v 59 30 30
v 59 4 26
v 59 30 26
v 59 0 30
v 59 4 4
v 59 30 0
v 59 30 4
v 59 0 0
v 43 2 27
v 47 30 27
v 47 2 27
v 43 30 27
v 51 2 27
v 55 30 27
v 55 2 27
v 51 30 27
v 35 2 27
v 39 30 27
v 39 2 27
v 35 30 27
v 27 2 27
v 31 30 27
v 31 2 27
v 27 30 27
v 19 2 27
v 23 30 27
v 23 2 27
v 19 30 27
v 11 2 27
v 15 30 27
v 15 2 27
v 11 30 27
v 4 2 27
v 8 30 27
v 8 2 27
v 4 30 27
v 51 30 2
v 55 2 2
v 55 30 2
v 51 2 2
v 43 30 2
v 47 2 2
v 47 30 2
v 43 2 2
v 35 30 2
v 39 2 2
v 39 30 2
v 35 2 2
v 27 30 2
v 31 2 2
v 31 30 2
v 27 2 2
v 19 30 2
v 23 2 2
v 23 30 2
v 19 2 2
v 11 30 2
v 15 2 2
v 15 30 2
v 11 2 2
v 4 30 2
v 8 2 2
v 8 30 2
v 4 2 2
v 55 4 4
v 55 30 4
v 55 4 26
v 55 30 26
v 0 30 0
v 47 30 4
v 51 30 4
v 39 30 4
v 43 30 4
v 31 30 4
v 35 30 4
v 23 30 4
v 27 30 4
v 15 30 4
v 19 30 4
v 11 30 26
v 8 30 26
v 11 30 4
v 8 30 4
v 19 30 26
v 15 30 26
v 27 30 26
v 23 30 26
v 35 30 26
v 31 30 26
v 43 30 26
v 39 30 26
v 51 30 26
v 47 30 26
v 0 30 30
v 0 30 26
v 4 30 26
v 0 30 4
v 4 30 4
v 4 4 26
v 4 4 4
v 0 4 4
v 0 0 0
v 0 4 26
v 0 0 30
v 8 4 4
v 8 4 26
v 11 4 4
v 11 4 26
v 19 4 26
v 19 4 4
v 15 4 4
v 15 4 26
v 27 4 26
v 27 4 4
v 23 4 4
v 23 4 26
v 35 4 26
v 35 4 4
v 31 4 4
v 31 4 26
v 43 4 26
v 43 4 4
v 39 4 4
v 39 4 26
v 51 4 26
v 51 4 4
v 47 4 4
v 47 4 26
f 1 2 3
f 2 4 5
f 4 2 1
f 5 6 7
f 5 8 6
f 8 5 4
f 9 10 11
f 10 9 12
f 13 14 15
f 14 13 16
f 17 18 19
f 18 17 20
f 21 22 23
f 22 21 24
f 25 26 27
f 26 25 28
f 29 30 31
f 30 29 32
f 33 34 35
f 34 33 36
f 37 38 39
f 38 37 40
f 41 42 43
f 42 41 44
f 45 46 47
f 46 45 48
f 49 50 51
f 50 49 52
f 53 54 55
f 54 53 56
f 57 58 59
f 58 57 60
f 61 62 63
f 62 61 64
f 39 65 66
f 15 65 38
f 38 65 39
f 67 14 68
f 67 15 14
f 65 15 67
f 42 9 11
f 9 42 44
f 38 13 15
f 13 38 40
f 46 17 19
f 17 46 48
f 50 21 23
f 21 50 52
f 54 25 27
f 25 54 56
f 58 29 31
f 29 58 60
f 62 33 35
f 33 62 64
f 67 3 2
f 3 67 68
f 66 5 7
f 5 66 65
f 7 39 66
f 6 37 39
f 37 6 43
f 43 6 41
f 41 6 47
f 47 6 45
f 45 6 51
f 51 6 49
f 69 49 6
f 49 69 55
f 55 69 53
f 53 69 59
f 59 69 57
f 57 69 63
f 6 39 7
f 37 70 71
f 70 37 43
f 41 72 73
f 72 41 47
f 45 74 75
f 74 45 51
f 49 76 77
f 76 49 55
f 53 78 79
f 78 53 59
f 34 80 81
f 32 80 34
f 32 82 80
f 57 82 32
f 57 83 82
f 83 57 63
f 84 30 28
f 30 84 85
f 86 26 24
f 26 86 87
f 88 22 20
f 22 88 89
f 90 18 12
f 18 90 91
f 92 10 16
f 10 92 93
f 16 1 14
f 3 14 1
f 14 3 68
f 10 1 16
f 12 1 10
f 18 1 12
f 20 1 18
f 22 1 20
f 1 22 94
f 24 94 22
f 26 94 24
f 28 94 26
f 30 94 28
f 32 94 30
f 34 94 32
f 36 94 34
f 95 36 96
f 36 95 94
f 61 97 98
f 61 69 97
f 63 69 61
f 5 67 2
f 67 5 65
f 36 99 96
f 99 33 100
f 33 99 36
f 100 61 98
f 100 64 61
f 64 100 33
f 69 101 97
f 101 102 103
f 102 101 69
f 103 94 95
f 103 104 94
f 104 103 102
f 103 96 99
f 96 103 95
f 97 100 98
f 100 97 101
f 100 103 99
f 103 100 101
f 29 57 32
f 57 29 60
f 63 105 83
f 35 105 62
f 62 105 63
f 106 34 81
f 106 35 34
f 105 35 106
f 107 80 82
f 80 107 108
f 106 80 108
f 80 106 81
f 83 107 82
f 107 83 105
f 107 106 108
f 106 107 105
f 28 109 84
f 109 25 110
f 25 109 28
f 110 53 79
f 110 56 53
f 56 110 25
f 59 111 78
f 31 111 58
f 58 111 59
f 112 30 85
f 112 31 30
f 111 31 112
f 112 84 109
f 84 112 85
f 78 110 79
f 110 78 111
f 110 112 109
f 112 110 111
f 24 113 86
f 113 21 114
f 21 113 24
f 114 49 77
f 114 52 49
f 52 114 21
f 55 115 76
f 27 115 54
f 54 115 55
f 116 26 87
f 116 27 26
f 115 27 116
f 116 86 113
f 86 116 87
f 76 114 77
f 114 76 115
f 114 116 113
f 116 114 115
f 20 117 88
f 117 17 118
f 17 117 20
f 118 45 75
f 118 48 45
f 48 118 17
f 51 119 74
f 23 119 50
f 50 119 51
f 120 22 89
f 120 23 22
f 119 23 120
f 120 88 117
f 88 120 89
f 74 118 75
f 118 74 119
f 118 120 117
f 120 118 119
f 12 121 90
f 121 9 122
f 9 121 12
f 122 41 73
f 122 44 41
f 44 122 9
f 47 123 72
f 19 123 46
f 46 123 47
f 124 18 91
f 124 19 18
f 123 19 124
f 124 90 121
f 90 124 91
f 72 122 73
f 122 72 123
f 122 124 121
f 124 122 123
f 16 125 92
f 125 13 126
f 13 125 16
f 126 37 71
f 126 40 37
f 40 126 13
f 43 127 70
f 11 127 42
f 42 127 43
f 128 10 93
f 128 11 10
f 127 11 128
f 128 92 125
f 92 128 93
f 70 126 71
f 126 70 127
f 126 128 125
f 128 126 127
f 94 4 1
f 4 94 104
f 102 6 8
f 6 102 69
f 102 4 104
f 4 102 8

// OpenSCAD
difference() {
  translate([29.5000000000, 15.0000000000, 15.0000000000]) {
    scale([59.0000000000, 30.0000000000, 30.0000000000]) {
      translate([-0.5000000000, -0.5000000000, -0.5000000000]) {
        cube([1, 1, 1]);
      }
    }
  }
  difference() {
    translate([29.5000000000, 16.0000204000, 14.5000000000]) {
      scale([59.0000000000, 28.0000000000, 25.0000000000]) {
        translate([-0.5000000000, -0.5000000000, -0.5000000000]) {
          cube([1, 1, 1]);
        }
      }
    }
    union() {
      union() {
        union() {
          union() {
            union() {
              union() {
                union() {
                  difference() {
                    translate([57.0000000000, 16.0000204000, 14.5000000000]) {
                      scale([4.0000000000, 28.0000000000, 25.0000000000]) {
                        translate([-0.5000000000, -0.5000000000, -0.5000000000]) {
                          cube([1, 1, 1]);
                        }
                      }
                    }
                    translate([57.0000000000, 17.0000000000, 15.0000000000]) {
                      scale([4.0000000000, 26.0000000000, 22.0000000000]) {
                        translate([-0.5000000000, -0.5000000000, -0.5000000000]) {
                          cube([1, 1, 1]);
                        }
                      }
                    }
                  }
                  difference() {
                    translate([2.0000000000, 16.0000204000, 14.5000000000]) {
                      scale([4.0000000000, 28.0000000000, 25.0000000000]) {
                        translate([-0.5000000000, -0.5000000000, -0.5000000000]) {
                          cube([1, 1, 1]);
                        }
                      }
                    }
                    translate([2.0000000000, 17.0000000000, 15.0000000000]) {
                      scale([4.0000000000, 26.0000000000, 22.0000000000]) {
                        translate([-0.5000000000, -0.5000000000, -0.5000000000]) {
                          cube([1, 1, 1]);
                        }
                      }
                    }
                  }
                }
                difference() {
                  translate([9.5000100000, 16.0000204000, 14.5000000000]) {
                    scale([3.0000000000, 28.0000000000, 25.0000000000]) {
                      translate([-0.5000000000, -0.5000000000, -0.5000000000]) {
                        cube([1, 1, 1]);
                      }
                    }
                  }
                  translate([9.5000000000, 17.0000000000, 15.0000000000]) {
                    scale([3.0000000000, 26.0000000000, 22.0000000000]) {
                      translate([-0.5000000000, -0.5000000000, -0.5000000000]) {
                        cube([1, 1, 1]);
                      }
                    }
                  }
                }
              }
              difference() {
                translate([17.0000000000, 16.0000204000, 14.5000000000]) {
                  scale([4.0000000000, 28.0000000000, 25.0000000000]) {
                    translate([-0.5000000000, -0.5000000000, -0.5000000000]) {
                      cube([1, 1, 1]);
                    }
                  }
                }
                translate([17.0000000000, 17.0000000000, 15.0000000000]) {
                  scale([4.0000000000, 26.0000000000, 22.0000000000]) {
                    translate([-0.5000000000, -0.5000000000, -0.5000000000]) {
                      cube([1, 1, 1]);
                    }
                  }
                }
              }
            }
            difference() {
              translate([25.0000000000, 16.0000204000, 14.5000000000]) {
                scale([4.0000000000, 28.0000000000, 25.0000000000]) {
                  translate([-0.5000000000, -0.5000000000, -0.5000000000]) {
                    cube([1, 1, 1]);
                  }
                }
              }
              translate([25.0000000000, 17.0000000000, 15.0000000000]) {
                scale([4.0000000000, 26.0000000000, 22.0000000000]) {
                  translate([-0.5000000000, -0.5000000000, -0.5000000000]) {
                    cube([1, 1, 1]);
                  }
                }
              }
            }
          }
          difference() {
            translate([33.0000000000, 16.0000204000, 14.5000000000]) {
              scale([4.0000000000, 28.0000000000, 25.0000000000]) {
                translate([-0.5000000000, -0.5000000000, -0.5000000000]) {
                  cube([1, 1, 1]);
                }
              }
            }
            translate([33.0000000000, 17.0000000000, 15.0000000000]) {
              scale([4.0000000000, 26.0000000000, 22.0000000000]) {
                translate([-0.5000000000, -0.5000000000, -0.5000000000]) {
                  cube([1, 1, 1]);
                }
              }
            }
          }
        }
        difference() {
          translate([41.0000000000, 16.0000204000, 14.5000000000]) {
            scale([4.0000000000, 28.0000000000, 25.0000000000]) {
              translate([-0.5000000000, -0.5000000000, -0.5000000000]) {
                cube([1, 1, 1]);
              }
            }
          }
          translate([41.0000000000, 17.0000000000, 15.0000000000]) {
            scale([4.0000000000, 26.0000000000, 22.0000000000]) {
              translate([-0.5000000000, -0.5000000000, -0.5000000000]) {
                cube([1, 1, 1]);
              }
            }
          }
        }
      }
      difference() {
        translate([49.0000000000, 16.0000204000, 14.5000000000]) {
          scale([4.0000000000, 28.0000000000, 25.0000000000]) {
            translate([-0.5000000000, -0.5000000000, -0.5000000000]) {
              cube([1, 1, 1]);
            }
          }
        }
        translate([49.0000000000, 17.0000000000, 15.0000000000]) {
          scale([4.0000000000, 26.0000000000, 22.0000000000]) {
            translate([-0.5000000000, -0.5000000000, -0.5000000000]) {
              cube([1, 1, 1]);
            }
          }
        }
      }
    }
  }
}
